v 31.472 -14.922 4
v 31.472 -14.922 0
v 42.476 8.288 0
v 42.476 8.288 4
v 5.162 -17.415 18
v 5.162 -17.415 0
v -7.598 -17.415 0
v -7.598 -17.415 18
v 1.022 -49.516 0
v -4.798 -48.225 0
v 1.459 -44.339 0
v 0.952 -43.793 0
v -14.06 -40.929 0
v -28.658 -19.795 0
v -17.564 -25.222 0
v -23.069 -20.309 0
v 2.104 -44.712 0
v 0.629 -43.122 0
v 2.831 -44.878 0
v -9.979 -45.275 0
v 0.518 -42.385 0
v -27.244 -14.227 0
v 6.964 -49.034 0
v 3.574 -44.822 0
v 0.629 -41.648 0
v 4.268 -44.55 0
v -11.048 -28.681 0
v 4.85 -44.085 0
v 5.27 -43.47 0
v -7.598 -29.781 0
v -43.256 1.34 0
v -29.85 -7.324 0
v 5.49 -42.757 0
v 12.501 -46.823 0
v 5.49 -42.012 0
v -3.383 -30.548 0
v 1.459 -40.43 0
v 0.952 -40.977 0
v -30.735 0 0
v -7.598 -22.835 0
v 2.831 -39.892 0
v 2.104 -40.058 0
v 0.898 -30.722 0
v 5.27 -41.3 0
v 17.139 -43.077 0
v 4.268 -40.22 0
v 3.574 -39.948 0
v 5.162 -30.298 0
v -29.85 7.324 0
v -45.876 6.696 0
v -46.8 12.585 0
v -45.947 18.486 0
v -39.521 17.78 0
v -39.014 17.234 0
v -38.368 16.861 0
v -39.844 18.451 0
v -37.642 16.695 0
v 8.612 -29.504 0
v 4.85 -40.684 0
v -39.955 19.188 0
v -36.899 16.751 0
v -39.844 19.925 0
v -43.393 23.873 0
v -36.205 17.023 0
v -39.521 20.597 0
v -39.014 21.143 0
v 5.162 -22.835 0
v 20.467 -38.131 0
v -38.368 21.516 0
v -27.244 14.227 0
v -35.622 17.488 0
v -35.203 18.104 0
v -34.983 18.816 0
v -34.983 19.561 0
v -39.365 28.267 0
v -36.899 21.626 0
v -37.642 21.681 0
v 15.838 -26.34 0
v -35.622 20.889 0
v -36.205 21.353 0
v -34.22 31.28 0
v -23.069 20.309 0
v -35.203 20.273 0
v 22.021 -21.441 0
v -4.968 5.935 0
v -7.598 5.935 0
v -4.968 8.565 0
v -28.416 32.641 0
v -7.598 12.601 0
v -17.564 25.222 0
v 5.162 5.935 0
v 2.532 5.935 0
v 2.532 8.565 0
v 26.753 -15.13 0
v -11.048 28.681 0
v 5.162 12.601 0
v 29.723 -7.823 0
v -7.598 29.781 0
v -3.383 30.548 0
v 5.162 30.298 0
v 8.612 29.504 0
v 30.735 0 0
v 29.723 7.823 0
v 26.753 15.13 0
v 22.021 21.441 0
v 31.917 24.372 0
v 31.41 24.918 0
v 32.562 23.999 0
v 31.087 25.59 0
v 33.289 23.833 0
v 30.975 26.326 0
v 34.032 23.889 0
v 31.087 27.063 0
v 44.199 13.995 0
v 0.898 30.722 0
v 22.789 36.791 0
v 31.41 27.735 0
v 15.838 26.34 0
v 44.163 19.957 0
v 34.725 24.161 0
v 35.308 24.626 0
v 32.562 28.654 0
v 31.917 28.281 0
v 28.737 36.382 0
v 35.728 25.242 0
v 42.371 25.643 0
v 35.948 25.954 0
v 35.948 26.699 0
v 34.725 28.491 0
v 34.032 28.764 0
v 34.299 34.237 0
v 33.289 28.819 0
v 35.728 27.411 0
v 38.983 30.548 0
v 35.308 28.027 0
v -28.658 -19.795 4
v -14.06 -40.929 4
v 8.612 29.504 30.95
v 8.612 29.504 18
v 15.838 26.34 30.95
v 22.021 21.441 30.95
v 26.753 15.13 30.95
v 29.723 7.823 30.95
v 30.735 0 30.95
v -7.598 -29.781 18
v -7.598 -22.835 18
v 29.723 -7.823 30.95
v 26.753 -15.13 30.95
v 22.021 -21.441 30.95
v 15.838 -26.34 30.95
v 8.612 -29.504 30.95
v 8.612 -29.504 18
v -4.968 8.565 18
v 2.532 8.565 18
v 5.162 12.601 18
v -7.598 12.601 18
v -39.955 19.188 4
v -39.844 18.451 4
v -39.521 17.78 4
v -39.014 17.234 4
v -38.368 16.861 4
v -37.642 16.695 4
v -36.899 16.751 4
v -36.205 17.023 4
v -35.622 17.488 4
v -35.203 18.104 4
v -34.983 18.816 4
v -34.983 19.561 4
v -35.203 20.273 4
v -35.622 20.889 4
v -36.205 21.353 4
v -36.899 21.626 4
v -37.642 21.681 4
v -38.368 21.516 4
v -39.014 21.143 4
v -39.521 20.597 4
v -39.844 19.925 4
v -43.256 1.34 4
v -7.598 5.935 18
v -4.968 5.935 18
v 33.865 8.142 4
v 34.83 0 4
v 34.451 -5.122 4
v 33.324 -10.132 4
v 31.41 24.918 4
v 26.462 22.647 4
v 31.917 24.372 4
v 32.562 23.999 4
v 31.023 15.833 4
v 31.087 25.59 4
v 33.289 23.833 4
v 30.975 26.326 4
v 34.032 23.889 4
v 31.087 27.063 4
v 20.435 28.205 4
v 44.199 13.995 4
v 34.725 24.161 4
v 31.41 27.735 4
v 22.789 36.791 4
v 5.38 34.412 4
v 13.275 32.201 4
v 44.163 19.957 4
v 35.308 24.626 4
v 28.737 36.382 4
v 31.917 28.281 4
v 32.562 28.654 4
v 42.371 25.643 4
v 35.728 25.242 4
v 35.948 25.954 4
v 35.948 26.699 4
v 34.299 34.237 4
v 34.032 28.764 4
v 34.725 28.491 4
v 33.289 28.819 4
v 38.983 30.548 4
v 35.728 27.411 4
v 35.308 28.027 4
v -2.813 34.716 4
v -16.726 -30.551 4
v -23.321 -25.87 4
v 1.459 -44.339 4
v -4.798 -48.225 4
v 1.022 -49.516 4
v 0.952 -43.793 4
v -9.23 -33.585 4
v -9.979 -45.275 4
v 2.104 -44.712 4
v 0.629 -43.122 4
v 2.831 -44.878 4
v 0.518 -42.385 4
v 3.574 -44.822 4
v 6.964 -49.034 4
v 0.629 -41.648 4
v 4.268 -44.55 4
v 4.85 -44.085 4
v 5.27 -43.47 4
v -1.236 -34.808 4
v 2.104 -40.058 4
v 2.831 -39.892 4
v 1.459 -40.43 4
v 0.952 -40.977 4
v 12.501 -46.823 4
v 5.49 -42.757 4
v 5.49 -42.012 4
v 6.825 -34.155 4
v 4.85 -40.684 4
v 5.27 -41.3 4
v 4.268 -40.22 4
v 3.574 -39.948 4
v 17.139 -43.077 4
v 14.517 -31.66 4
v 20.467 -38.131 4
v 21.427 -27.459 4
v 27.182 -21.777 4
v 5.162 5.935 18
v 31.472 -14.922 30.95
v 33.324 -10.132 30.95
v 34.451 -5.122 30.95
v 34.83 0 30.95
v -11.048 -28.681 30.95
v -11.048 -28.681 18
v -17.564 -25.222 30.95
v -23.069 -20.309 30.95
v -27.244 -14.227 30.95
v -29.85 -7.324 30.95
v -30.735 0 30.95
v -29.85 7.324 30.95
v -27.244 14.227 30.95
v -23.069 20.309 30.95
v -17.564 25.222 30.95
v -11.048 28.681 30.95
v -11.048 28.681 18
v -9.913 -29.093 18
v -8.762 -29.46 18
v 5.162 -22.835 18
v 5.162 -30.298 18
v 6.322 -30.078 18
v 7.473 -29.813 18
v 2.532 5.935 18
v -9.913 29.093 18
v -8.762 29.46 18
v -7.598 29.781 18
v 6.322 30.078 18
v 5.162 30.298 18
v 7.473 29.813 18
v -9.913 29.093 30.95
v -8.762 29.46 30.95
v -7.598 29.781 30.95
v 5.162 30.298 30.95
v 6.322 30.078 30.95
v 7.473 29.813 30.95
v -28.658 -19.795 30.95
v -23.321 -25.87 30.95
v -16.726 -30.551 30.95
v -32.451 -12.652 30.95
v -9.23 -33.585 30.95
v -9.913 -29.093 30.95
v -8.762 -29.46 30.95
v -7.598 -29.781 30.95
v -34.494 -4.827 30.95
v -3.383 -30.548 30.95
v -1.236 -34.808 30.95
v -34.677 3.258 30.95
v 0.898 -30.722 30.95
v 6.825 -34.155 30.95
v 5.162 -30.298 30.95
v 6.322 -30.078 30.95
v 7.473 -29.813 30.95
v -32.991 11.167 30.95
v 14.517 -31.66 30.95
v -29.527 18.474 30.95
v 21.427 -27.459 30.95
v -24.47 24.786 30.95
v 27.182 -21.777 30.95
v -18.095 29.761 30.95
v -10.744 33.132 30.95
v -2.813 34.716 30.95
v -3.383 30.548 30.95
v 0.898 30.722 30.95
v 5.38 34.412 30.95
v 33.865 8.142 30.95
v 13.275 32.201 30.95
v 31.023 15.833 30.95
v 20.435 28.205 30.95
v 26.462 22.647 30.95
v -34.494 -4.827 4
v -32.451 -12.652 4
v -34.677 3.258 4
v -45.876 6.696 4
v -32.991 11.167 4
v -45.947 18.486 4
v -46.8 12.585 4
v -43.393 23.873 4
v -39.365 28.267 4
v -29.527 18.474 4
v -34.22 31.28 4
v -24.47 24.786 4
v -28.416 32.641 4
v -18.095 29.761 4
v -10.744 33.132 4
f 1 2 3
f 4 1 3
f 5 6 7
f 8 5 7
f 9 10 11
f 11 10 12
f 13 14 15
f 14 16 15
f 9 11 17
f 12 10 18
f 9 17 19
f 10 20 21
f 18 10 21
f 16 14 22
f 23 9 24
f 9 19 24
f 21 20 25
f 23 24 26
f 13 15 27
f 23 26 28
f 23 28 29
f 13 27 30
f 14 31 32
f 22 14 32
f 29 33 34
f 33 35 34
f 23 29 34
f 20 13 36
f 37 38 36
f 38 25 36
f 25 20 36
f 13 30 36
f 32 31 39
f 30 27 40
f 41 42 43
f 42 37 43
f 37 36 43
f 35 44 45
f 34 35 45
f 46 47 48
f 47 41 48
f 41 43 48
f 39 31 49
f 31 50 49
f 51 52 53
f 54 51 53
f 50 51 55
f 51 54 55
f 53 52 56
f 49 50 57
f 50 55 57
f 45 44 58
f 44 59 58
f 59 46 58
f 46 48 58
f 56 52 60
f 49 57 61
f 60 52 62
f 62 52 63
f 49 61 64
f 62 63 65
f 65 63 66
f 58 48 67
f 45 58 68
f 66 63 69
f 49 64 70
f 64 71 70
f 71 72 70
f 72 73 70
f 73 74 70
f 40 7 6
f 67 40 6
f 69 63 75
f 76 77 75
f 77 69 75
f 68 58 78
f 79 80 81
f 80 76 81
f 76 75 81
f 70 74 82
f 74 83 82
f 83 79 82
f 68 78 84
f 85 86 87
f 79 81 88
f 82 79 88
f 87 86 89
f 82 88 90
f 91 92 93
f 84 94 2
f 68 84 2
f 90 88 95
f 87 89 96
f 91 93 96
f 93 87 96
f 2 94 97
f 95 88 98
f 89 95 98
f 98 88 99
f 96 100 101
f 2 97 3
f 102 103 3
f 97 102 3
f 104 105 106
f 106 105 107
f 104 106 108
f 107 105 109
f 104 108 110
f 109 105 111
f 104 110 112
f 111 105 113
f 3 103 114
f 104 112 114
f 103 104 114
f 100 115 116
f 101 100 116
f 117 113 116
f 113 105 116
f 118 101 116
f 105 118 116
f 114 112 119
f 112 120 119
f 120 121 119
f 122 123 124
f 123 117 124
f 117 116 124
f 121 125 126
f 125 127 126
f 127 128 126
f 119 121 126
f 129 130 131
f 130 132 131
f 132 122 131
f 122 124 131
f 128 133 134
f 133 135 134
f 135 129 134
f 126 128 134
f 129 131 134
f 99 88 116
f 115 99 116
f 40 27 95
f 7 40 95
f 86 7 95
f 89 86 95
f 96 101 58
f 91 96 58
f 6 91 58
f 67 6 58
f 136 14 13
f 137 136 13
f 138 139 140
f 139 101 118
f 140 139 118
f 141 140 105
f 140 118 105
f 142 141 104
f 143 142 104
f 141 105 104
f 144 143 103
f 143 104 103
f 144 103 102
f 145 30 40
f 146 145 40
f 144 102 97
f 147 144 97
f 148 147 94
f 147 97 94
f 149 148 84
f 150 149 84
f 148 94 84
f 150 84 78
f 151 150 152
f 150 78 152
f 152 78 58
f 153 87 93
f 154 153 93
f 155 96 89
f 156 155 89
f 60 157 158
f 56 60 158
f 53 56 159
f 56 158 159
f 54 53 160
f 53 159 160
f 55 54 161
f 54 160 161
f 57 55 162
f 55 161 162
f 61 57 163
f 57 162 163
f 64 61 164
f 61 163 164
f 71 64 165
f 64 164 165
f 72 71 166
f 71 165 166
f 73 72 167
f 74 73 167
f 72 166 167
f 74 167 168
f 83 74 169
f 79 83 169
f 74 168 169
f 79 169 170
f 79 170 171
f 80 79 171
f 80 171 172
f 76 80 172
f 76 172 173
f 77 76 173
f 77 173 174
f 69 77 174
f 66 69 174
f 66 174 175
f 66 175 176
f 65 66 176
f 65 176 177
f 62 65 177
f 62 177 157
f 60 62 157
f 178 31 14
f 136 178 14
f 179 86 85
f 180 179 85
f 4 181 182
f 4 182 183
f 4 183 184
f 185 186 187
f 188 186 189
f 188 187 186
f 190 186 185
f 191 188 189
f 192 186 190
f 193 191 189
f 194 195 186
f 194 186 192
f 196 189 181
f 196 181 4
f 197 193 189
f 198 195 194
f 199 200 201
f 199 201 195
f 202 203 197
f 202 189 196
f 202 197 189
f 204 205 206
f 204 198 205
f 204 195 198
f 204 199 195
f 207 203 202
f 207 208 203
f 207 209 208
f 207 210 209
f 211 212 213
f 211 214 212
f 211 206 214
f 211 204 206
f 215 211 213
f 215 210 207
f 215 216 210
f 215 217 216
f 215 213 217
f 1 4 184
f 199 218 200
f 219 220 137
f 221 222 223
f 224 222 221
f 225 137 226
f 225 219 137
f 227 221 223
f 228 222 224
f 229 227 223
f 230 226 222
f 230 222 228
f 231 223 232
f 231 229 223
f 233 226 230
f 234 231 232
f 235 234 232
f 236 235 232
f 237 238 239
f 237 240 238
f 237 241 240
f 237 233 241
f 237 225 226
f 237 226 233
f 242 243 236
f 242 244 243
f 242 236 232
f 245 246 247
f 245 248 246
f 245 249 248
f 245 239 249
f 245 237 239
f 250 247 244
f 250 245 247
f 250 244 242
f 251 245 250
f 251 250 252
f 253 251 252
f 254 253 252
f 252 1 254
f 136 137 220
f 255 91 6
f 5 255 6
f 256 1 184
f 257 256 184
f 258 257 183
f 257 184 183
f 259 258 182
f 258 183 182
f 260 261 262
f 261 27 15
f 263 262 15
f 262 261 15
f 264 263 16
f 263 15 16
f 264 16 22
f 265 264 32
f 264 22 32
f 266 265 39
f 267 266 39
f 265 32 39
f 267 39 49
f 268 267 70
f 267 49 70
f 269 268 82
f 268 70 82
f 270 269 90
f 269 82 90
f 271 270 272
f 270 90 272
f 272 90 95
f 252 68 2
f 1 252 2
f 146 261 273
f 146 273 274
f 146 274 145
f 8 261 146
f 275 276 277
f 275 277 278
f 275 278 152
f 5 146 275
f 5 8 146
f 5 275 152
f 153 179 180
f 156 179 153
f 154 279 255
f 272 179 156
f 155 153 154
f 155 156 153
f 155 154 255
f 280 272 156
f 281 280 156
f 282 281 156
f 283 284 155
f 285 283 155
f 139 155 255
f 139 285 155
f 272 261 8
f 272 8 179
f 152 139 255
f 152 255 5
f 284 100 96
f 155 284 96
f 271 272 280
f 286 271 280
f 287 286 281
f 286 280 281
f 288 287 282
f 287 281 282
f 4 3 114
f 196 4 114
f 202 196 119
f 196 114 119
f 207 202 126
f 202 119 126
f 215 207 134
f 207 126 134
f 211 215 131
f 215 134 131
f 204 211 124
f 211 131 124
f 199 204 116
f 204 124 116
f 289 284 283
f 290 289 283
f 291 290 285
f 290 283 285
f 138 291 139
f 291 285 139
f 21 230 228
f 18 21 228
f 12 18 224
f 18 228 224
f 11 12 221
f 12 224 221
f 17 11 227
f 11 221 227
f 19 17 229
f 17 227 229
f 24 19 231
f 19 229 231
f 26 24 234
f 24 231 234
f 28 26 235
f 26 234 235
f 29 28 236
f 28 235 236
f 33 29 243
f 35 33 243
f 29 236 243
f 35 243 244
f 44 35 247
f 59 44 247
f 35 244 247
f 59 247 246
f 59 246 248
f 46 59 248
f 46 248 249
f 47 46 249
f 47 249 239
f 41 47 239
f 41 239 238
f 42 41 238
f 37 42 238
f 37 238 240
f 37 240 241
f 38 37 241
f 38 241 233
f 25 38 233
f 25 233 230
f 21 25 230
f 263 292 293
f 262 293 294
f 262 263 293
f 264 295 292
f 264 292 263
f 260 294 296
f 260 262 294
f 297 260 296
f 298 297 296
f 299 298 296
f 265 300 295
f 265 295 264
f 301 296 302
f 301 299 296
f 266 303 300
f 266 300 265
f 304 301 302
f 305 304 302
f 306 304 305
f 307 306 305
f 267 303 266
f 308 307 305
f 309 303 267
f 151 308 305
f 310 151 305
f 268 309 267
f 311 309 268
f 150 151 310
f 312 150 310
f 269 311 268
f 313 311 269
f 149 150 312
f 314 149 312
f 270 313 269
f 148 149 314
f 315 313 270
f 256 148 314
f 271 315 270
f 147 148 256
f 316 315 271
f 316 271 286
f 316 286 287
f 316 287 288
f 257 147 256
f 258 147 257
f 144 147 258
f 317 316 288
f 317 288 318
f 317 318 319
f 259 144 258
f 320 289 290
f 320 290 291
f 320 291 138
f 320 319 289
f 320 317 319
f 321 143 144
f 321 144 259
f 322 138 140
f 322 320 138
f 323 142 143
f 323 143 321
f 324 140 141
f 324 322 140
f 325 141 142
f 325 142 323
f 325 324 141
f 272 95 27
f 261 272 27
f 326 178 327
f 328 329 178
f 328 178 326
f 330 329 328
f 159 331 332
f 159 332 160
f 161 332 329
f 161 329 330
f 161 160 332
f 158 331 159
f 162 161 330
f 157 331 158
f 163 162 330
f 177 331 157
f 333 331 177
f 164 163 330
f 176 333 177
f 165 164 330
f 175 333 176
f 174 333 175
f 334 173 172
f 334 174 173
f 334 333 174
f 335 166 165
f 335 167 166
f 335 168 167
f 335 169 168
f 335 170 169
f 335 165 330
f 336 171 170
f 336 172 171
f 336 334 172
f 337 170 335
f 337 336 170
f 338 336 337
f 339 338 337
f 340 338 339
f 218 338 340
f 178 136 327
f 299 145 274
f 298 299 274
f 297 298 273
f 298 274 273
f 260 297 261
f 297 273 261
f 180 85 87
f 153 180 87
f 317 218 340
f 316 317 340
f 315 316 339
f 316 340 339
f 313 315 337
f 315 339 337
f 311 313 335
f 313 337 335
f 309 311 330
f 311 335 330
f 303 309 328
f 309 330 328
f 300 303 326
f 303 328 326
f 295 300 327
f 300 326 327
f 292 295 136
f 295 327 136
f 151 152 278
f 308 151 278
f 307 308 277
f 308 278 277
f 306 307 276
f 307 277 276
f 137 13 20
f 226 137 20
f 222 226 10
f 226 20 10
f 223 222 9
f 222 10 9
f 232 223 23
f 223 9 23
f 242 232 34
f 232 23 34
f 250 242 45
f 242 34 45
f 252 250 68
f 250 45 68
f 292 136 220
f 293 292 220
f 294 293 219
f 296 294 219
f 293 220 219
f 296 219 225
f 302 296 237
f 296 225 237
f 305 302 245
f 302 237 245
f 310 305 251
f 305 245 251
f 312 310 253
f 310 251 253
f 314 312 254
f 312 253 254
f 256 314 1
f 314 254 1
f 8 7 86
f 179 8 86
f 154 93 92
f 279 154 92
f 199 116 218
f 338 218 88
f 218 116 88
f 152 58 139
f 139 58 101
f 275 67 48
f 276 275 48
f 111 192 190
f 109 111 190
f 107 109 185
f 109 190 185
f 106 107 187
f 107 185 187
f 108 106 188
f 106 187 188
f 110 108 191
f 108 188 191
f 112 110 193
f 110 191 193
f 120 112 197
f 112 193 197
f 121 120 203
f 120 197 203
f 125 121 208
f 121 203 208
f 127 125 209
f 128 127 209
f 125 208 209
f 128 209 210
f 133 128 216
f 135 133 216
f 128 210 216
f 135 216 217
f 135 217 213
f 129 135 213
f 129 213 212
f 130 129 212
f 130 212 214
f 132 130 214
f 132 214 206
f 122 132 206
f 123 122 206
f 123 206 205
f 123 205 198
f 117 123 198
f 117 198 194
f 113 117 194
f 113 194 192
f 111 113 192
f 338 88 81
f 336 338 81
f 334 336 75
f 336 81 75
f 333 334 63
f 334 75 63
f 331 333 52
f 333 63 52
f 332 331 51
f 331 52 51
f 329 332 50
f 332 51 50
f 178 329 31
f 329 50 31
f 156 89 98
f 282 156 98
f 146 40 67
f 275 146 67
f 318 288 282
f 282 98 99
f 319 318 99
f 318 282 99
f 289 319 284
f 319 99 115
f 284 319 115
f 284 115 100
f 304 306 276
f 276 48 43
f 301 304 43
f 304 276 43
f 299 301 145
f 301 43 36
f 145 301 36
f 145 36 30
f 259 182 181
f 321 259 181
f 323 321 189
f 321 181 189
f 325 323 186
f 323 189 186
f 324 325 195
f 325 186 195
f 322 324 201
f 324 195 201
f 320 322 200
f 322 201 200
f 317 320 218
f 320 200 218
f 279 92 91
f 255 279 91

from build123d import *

# Parameters (mm, degrees)
F1_DEPTH = 30.95
F2_DEPTH = 18
F4_DEPTH = 4
F5_DEPTH = 4
F6_D     = 5


with BuildPart() as f1:
    # F0 (on Top) → F1 (new body)
    with BuildSketch(Plane.XY):
        with BuildLine():
            ThreePointArc((31.4718047667, -14.9216086508), (33.9800813715, -7.6474159027), (34.83, 0))
            ThreePointArc((34.83, 0), (23.6128968094, 25.6039060354), (-2.8134110978, 34.7161866857))
            ThreePointArc((-2.8134110978, 34.7161866857), (-31.4718050367, 14.9216080814), (-28.6583943208, -19.7945784232))
            ThreePointArc((-28.6583943208, -19.7945784232), (2.8134104188, -34.7161867407), (31.4718047667, -14.9216086508))
        make_face()
        with BuildLine():
            ThreePointArc((8.6120840205, 29.5037664345), (24.589963678, 18.4383814722), (30.735, 0))
            ThreePointArc((30.735, 0), (24.589963678, -18.4383814722), (8.6120840205, -29.5037664345))
            ThreePointArc((8.6120840205, -29.5037664345), (6.8985351632, -29.9508002832), (5.1620840205, -30.2984011718))
            ThreePointArc((5.1620840205, -30.2984011718), (-1.2450816151, -30.7097703797), (-7.5979159795, -29.7810660952))
            ThreePointArc((-7.5979159795, -29.7810660952), (-9.3391355058, -29.2817481207), (-11.0479159795, -28.6807213562))
            ThreePointArc((-11.0479159795, -28.6807213562), (-30.735, 0), (-11.0479159795, 28.6807213562))
            ThreePointArc((-11.0479159795, 28.6807213562), (-9.3391355058, 29.2817481207), (-7.5979159795, 29.7810660952))
            ThreePointArc((-7.5979159795, 29.7810660952), (-1.2450816151, 30.7097703797), (5.1620840205, 30.2984011718))
            ThreePointArc((5.1620840205, 30.2984011718), (6.8985351632, 29.9508002832), (8.6120840205, 29.5037664345))
        make_face(mode=Mode.SUBTRACT)
    extrude(amount=F1_DEPTH)

    # F0 (on Top) → F2 (join)
    with BuildSketch(Plane.XY):
        with BuildLine():
            Line((8.6120840205, 28.6807213562), (8.6120840205, 29.5037664345))
            ThreePointArc((8.6120840205, 29.5037664345), (6.8985351632, 29.9508002832), (5.1620840205, 30.2984011718))
            Line((5.1620840205, 30.2984011718), (5.1620840205, 12.6006845385))
            Line((5.1620840205, 12.6006845385), (-7.5979159795, 12.6006845385))
            Line((-7.5979159795, 12.6006845385), (-7.5979159795, 29.7810660952))
            ThreePointArc((-7.5979159795, 29.7810660952), (-9.3391355058, 29.2817481207), (-11.0479159795, 28.6807213562))
            Line((-11.0479159795, 28.6807213562), (-11.0479159795, -28.6807213562))
            ThreePointArc((-11.0479159795, -28.6807213562), (-9.3391355058, -29.2817481207), (-7.5979159795, -29.7810660952))
            Line((-7.5979159795, -29.7810660952), (-7.5979159795, -22.835))
            Line((-7.5979159795, -22.835), (5.1620840205, -22.835))
            Line((5.1620840205, -22.835), (5.1620840205, -30.2984011718))
            ThreePointArc((5.1620840205, -30.2984011718), (6.8985351632, -29.9508002832), (8.6120840205, -29.5037664345))
            Line((8.6120840205, -29.5037664345), (8.6120840205, 28.6807213562))
        make_face()
        Polygon((5.1620840205, -17.415), (-7.5979159795, -17.415), (-7.5979159795, 5.935), (-4.9679159795, 5.935), (-4.9679159795, 8.565), (2.5320840205, 8.565), (2.5320840205, 5.935), (5.1620840205, 5.935), align=None, mode=Mode.SUBTRACT)
    extrude(amount=F2_DEPTH)

    # F0 (on Top) → F4 (join)
    with BuildSketch(Plane.XY):
        with BuildLine():
            ThreePointArc((-28.6583943208, -19.7945784232), (-31.4718050367, 14.9216080814), (-2.8134110978, 34.7161866857))
            Line((-2.8134110978, 34.7161866857), (-28.4157888205, 32.6413624978))
            ThreePointArc((-28.4157888205, 32.6413624978), (-44.8719442624, 21.2749669357), (-43.2564346771, 1.3403204934))
            Line((-43.2564346771, 1.3403204934), (-28.6583943208, -19.7945784232))
        make_face()
        with BuildLine():
            ThreePointArc((-2.8134110978, 34.7161866857), (23.6128968094, 25.6039060354), (34.83, 0))
            ThreePointArc((34.83, 0), (33.9800813715, -7.6474159027), (31.4718047667, -14.9216086508))
            Line((31.4718047667, -14.9216086508), (42.4761435474, 8.2881137382))
            ThreePointArc((42.4761435474, 8.2881137382), (40.8606339622, 28.2227601805), (22.7889689351, 36.7910110608))
            Line((22.7889689351, 36.7910110608), (-2.8134110978, 34.7161866857))
        make_face()
    extrude(amount=F4_DEPTH)

    # F0 (on Top) → F5 (join)
    with BuildSketch(Plane.XY):
        with BuildLine():
            Line((20.467465742, -38.1313315542), (31.4718047667, -14.9216086508))
            ThreePointArc((31.4718047667, -14.9216086508), (2.8134104188, -34.7161867407), (-28.6583943208, -19.7945784232))
            Line((-28.6583943208, -19.7945784232), (-14.060354727, -40.929476236))
            ThreePointArc((-14.060354727, -40.929476236), (4.0113103002, -49.4977271163), (20.467465742, -38.1313315542))
        make_face()
    extrude(amount=F5_DEPTH)

    # F6 (through all)
    with Locations(Plane(origin=(0, 0, 0), x_dir=(1, 0, 0), z_dir=(0, 0, -1))):
        with Locations((-37.4550744891, -19.1883724183), (33.4754809737, -26.3264067471), (3.0176348519, 42.3848293722)):
            Hole(F6_D / 2)


solid = f1.part
